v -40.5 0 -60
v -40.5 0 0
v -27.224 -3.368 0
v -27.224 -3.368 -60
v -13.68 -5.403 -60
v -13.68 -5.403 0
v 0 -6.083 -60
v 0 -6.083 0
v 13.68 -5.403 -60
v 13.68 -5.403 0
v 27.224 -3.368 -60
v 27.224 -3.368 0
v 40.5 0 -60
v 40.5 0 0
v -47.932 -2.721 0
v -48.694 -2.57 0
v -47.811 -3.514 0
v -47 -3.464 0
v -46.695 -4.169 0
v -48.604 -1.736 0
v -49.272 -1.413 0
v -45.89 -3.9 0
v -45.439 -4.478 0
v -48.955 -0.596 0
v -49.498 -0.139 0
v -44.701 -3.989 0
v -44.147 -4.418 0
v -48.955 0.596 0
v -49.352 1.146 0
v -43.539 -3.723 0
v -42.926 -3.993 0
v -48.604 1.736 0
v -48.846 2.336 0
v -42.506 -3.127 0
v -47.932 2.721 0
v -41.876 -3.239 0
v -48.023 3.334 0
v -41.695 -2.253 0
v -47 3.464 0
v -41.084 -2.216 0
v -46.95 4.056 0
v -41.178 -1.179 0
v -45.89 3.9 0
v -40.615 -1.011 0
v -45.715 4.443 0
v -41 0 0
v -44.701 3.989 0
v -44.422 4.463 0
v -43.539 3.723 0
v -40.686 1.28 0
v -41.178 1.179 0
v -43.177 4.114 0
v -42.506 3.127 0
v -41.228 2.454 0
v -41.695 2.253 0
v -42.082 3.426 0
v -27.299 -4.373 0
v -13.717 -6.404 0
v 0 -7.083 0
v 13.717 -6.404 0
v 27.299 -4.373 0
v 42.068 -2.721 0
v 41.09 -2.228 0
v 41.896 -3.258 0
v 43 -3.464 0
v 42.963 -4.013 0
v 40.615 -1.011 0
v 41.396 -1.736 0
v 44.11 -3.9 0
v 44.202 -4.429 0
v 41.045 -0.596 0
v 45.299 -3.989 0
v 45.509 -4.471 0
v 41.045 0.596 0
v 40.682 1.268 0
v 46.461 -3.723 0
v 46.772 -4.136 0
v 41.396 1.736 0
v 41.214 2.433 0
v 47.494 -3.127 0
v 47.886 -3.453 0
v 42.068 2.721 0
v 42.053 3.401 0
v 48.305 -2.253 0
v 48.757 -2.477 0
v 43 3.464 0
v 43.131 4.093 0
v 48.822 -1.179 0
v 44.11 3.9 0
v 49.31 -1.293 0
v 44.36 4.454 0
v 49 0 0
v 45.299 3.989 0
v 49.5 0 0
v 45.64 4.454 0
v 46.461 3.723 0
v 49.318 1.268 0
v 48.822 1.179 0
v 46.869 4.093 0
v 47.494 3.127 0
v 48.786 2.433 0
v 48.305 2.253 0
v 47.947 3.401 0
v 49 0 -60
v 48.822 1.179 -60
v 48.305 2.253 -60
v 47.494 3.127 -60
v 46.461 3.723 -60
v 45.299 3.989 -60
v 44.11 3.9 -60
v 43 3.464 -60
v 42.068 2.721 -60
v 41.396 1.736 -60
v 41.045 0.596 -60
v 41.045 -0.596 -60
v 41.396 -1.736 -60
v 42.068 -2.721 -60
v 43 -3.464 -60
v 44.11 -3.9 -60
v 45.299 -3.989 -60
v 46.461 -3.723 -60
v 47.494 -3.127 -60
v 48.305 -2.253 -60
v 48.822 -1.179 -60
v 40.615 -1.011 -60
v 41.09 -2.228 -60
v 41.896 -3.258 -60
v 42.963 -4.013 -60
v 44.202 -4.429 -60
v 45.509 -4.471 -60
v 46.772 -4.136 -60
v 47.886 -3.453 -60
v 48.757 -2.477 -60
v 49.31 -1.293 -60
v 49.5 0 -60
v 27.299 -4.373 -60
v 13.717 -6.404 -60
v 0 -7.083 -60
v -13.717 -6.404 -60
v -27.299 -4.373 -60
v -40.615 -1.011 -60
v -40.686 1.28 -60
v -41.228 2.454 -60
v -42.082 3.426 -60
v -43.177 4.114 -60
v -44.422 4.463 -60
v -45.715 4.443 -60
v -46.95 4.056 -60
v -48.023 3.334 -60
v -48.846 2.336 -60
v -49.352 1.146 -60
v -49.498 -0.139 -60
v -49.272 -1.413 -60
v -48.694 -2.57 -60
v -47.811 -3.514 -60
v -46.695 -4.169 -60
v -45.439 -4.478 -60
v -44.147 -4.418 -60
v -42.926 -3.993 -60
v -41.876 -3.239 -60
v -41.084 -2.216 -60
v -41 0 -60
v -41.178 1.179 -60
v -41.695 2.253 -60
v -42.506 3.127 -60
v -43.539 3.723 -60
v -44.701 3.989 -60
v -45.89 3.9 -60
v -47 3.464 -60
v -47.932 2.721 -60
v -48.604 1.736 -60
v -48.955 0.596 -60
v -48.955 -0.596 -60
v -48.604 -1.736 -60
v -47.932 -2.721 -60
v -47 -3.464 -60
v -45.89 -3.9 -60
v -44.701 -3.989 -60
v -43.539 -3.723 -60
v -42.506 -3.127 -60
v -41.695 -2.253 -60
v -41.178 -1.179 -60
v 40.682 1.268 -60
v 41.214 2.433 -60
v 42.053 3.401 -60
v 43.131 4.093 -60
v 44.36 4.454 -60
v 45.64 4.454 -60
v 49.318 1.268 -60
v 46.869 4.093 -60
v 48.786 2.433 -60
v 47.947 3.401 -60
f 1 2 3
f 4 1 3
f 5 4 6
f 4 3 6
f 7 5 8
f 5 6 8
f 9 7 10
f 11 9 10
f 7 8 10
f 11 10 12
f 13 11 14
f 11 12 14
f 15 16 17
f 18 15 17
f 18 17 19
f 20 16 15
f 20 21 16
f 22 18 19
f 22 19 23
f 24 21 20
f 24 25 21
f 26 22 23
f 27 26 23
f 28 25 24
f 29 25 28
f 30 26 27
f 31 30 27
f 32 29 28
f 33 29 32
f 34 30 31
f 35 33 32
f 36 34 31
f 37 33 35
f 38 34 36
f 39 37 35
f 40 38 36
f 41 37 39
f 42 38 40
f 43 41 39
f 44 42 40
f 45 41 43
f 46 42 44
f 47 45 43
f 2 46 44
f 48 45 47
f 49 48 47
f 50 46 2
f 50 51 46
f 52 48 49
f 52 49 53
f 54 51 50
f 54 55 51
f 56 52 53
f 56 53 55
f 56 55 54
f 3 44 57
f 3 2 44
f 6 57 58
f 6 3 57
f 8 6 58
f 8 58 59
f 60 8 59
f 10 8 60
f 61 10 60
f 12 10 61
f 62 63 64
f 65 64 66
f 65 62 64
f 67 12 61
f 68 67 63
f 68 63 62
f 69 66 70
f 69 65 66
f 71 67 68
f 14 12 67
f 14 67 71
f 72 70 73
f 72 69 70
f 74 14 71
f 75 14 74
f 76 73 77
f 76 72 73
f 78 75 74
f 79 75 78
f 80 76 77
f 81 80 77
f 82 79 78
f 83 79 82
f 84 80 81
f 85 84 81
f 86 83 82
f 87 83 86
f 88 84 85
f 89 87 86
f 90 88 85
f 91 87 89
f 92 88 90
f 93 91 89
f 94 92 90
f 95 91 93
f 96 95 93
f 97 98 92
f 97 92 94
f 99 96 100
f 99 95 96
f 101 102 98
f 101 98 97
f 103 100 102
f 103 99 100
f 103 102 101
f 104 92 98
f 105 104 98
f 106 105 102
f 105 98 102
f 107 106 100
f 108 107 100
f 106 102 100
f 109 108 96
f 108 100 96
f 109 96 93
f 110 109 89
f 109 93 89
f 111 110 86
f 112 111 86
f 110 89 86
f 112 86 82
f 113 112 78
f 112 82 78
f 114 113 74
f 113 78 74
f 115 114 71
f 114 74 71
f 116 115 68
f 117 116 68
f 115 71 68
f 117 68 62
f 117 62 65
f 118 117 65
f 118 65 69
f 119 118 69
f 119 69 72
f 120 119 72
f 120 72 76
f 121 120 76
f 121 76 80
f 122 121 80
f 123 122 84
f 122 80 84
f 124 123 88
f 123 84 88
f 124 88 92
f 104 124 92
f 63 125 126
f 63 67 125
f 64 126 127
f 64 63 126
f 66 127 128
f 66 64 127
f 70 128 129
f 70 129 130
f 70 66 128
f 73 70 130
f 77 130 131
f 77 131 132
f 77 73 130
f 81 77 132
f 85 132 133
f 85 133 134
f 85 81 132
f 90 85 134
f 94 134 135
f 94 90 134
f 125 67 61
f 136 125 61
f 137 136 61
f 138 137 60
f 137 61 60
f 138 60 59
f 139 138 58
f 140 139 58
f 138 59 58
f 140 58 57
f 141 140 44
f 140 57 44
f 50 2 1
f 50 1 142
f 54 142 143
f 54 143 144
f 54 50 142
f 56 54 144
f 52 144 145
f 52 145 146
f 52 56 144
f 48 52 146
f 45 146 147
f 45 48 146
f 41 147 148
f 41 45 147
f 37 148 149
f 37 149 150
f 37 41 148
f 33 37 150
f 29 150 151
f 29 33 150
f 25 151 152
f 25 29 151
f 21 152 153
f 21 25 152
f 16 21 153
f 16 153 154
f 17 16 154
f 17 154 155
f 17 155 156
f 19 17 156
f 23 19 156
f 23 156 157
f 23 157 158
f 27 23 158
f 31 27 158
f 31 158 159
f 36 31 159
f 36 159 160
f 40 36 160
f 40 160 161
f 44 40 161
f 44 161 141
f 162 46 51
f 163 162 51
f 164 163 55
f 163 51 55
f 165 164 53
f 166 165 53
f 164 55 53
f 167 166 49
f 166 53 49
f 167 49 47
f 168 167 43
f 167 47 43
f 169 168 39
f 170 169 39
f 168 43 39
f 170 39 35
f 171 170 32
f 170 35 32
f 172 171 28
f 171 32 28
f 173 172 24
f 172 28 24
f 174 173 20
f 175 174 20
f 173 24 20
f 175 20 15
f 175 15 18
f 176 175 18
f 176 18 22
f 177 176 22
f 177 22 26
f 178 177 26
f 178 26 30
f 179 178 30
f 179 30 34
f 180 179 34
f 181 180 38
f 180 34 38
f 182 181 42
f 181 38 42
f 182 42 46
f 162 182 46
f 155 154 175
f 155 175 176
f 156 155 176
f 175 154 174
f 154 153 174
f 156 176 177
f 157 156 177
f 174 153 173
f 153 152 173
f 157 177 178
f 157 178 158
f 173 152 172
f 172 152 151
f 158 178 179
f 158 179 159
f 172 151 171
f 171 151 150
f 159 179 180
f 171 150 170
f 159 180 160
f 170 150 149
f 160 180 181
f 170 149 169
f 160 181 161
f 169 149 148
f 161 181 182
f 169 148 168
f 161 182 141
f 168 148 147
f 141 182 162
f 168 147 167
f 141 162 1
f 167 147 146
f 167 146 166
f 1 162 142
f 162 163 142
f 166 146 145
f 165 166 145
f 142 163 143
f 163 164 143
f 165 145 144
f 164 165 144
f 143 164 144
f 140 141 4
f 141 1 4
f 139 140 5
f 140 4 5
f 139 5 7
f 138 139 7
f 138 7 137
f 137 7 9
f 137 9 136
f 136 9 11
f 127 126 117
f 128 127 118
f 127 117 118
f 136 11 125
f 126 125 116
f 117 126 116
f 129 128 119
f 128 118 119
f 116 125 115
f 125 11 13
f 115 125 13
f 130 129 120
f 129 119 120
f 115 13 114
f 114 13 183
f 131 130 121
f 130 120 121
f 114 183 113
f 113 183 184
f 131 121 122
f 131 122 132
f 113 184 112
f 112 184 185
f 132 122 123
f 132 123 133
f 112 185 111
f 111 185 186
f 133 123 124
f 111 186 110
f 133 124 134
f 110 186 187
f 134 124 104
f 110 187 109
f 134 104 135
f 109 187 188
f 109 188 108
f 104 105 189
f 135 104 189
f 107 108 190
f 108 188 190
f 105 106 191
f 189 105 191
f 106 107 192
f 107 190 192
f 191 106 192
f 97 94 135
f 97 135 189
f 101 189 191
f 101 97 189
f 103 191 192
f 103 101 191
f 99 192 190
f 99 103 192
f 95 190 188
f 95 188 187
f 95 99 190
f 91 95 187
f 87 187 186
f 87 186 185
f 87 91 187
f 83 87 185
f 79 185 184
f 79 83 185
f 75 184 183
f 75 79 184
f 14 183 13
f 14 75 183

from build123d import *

# Parameters (mm, degrees)
SKETCH2_R             = 4.5
SKETCH2_R_2           = 4
BOSS_EXTRUDE1_DEPTH   = 60
BOSS_EXTRUDE1_2_DEPTH = 60
BOSS_EXTRUDE2_DEPTH   = 60


with BuildPart() as part:
    # Sketch2 → Boss-Extrude1 (new body)
    with BuildSketch(Plane.XY):
        with Locations((-45, 0)):
            Circle(SKETCH2_R)
        with Locations((-45, 0)):
            Circle(SKETCH2_R_2, mode=Mode.SUBTRACT)
    extrude(amount=-BOSS_EXTRUDE1_DEPTH)



with BuildPart() as body_2:
    # Sketch2 → Boss-Extrude1 2 (new body)
    with BuildSketch(Plane.XY):
        with Locations((45, 0)):
            Circle(SKETCH2_R)
        with Locations((45, 0)):
            Circle(SKETCH2_R_2, mode=Mode.SUBTRACT)
    extrude(amount=-BOSS_EXTRUDE1_2_DEPTH)


with BuildPart() as part_1:
    add(part.part)

    add(body_2.part)  # Boss-Extrude2 merges body 2
    # Sketch3 → Boss-Extrude2 (add)
    with BuildSketch(Plane.XY):
        with BuildLine():
            Line((40.5, 0), (40.793767043, -0.955877045))
            ThreePointArc((40.793767043, -0.955877045), (0, -7.082982188), (-40.793767043, -0.955877045))
            Line((-40.793767043, -0.955877045), (-40.5, 0))
            ThreePointArc((-40.5, 0), (0, -6.082982188), (40.5, 0))
        make_face()
    extrude(amount=-BOSS_EXTRUDE2_DEPTH)


solid = part_1.part
